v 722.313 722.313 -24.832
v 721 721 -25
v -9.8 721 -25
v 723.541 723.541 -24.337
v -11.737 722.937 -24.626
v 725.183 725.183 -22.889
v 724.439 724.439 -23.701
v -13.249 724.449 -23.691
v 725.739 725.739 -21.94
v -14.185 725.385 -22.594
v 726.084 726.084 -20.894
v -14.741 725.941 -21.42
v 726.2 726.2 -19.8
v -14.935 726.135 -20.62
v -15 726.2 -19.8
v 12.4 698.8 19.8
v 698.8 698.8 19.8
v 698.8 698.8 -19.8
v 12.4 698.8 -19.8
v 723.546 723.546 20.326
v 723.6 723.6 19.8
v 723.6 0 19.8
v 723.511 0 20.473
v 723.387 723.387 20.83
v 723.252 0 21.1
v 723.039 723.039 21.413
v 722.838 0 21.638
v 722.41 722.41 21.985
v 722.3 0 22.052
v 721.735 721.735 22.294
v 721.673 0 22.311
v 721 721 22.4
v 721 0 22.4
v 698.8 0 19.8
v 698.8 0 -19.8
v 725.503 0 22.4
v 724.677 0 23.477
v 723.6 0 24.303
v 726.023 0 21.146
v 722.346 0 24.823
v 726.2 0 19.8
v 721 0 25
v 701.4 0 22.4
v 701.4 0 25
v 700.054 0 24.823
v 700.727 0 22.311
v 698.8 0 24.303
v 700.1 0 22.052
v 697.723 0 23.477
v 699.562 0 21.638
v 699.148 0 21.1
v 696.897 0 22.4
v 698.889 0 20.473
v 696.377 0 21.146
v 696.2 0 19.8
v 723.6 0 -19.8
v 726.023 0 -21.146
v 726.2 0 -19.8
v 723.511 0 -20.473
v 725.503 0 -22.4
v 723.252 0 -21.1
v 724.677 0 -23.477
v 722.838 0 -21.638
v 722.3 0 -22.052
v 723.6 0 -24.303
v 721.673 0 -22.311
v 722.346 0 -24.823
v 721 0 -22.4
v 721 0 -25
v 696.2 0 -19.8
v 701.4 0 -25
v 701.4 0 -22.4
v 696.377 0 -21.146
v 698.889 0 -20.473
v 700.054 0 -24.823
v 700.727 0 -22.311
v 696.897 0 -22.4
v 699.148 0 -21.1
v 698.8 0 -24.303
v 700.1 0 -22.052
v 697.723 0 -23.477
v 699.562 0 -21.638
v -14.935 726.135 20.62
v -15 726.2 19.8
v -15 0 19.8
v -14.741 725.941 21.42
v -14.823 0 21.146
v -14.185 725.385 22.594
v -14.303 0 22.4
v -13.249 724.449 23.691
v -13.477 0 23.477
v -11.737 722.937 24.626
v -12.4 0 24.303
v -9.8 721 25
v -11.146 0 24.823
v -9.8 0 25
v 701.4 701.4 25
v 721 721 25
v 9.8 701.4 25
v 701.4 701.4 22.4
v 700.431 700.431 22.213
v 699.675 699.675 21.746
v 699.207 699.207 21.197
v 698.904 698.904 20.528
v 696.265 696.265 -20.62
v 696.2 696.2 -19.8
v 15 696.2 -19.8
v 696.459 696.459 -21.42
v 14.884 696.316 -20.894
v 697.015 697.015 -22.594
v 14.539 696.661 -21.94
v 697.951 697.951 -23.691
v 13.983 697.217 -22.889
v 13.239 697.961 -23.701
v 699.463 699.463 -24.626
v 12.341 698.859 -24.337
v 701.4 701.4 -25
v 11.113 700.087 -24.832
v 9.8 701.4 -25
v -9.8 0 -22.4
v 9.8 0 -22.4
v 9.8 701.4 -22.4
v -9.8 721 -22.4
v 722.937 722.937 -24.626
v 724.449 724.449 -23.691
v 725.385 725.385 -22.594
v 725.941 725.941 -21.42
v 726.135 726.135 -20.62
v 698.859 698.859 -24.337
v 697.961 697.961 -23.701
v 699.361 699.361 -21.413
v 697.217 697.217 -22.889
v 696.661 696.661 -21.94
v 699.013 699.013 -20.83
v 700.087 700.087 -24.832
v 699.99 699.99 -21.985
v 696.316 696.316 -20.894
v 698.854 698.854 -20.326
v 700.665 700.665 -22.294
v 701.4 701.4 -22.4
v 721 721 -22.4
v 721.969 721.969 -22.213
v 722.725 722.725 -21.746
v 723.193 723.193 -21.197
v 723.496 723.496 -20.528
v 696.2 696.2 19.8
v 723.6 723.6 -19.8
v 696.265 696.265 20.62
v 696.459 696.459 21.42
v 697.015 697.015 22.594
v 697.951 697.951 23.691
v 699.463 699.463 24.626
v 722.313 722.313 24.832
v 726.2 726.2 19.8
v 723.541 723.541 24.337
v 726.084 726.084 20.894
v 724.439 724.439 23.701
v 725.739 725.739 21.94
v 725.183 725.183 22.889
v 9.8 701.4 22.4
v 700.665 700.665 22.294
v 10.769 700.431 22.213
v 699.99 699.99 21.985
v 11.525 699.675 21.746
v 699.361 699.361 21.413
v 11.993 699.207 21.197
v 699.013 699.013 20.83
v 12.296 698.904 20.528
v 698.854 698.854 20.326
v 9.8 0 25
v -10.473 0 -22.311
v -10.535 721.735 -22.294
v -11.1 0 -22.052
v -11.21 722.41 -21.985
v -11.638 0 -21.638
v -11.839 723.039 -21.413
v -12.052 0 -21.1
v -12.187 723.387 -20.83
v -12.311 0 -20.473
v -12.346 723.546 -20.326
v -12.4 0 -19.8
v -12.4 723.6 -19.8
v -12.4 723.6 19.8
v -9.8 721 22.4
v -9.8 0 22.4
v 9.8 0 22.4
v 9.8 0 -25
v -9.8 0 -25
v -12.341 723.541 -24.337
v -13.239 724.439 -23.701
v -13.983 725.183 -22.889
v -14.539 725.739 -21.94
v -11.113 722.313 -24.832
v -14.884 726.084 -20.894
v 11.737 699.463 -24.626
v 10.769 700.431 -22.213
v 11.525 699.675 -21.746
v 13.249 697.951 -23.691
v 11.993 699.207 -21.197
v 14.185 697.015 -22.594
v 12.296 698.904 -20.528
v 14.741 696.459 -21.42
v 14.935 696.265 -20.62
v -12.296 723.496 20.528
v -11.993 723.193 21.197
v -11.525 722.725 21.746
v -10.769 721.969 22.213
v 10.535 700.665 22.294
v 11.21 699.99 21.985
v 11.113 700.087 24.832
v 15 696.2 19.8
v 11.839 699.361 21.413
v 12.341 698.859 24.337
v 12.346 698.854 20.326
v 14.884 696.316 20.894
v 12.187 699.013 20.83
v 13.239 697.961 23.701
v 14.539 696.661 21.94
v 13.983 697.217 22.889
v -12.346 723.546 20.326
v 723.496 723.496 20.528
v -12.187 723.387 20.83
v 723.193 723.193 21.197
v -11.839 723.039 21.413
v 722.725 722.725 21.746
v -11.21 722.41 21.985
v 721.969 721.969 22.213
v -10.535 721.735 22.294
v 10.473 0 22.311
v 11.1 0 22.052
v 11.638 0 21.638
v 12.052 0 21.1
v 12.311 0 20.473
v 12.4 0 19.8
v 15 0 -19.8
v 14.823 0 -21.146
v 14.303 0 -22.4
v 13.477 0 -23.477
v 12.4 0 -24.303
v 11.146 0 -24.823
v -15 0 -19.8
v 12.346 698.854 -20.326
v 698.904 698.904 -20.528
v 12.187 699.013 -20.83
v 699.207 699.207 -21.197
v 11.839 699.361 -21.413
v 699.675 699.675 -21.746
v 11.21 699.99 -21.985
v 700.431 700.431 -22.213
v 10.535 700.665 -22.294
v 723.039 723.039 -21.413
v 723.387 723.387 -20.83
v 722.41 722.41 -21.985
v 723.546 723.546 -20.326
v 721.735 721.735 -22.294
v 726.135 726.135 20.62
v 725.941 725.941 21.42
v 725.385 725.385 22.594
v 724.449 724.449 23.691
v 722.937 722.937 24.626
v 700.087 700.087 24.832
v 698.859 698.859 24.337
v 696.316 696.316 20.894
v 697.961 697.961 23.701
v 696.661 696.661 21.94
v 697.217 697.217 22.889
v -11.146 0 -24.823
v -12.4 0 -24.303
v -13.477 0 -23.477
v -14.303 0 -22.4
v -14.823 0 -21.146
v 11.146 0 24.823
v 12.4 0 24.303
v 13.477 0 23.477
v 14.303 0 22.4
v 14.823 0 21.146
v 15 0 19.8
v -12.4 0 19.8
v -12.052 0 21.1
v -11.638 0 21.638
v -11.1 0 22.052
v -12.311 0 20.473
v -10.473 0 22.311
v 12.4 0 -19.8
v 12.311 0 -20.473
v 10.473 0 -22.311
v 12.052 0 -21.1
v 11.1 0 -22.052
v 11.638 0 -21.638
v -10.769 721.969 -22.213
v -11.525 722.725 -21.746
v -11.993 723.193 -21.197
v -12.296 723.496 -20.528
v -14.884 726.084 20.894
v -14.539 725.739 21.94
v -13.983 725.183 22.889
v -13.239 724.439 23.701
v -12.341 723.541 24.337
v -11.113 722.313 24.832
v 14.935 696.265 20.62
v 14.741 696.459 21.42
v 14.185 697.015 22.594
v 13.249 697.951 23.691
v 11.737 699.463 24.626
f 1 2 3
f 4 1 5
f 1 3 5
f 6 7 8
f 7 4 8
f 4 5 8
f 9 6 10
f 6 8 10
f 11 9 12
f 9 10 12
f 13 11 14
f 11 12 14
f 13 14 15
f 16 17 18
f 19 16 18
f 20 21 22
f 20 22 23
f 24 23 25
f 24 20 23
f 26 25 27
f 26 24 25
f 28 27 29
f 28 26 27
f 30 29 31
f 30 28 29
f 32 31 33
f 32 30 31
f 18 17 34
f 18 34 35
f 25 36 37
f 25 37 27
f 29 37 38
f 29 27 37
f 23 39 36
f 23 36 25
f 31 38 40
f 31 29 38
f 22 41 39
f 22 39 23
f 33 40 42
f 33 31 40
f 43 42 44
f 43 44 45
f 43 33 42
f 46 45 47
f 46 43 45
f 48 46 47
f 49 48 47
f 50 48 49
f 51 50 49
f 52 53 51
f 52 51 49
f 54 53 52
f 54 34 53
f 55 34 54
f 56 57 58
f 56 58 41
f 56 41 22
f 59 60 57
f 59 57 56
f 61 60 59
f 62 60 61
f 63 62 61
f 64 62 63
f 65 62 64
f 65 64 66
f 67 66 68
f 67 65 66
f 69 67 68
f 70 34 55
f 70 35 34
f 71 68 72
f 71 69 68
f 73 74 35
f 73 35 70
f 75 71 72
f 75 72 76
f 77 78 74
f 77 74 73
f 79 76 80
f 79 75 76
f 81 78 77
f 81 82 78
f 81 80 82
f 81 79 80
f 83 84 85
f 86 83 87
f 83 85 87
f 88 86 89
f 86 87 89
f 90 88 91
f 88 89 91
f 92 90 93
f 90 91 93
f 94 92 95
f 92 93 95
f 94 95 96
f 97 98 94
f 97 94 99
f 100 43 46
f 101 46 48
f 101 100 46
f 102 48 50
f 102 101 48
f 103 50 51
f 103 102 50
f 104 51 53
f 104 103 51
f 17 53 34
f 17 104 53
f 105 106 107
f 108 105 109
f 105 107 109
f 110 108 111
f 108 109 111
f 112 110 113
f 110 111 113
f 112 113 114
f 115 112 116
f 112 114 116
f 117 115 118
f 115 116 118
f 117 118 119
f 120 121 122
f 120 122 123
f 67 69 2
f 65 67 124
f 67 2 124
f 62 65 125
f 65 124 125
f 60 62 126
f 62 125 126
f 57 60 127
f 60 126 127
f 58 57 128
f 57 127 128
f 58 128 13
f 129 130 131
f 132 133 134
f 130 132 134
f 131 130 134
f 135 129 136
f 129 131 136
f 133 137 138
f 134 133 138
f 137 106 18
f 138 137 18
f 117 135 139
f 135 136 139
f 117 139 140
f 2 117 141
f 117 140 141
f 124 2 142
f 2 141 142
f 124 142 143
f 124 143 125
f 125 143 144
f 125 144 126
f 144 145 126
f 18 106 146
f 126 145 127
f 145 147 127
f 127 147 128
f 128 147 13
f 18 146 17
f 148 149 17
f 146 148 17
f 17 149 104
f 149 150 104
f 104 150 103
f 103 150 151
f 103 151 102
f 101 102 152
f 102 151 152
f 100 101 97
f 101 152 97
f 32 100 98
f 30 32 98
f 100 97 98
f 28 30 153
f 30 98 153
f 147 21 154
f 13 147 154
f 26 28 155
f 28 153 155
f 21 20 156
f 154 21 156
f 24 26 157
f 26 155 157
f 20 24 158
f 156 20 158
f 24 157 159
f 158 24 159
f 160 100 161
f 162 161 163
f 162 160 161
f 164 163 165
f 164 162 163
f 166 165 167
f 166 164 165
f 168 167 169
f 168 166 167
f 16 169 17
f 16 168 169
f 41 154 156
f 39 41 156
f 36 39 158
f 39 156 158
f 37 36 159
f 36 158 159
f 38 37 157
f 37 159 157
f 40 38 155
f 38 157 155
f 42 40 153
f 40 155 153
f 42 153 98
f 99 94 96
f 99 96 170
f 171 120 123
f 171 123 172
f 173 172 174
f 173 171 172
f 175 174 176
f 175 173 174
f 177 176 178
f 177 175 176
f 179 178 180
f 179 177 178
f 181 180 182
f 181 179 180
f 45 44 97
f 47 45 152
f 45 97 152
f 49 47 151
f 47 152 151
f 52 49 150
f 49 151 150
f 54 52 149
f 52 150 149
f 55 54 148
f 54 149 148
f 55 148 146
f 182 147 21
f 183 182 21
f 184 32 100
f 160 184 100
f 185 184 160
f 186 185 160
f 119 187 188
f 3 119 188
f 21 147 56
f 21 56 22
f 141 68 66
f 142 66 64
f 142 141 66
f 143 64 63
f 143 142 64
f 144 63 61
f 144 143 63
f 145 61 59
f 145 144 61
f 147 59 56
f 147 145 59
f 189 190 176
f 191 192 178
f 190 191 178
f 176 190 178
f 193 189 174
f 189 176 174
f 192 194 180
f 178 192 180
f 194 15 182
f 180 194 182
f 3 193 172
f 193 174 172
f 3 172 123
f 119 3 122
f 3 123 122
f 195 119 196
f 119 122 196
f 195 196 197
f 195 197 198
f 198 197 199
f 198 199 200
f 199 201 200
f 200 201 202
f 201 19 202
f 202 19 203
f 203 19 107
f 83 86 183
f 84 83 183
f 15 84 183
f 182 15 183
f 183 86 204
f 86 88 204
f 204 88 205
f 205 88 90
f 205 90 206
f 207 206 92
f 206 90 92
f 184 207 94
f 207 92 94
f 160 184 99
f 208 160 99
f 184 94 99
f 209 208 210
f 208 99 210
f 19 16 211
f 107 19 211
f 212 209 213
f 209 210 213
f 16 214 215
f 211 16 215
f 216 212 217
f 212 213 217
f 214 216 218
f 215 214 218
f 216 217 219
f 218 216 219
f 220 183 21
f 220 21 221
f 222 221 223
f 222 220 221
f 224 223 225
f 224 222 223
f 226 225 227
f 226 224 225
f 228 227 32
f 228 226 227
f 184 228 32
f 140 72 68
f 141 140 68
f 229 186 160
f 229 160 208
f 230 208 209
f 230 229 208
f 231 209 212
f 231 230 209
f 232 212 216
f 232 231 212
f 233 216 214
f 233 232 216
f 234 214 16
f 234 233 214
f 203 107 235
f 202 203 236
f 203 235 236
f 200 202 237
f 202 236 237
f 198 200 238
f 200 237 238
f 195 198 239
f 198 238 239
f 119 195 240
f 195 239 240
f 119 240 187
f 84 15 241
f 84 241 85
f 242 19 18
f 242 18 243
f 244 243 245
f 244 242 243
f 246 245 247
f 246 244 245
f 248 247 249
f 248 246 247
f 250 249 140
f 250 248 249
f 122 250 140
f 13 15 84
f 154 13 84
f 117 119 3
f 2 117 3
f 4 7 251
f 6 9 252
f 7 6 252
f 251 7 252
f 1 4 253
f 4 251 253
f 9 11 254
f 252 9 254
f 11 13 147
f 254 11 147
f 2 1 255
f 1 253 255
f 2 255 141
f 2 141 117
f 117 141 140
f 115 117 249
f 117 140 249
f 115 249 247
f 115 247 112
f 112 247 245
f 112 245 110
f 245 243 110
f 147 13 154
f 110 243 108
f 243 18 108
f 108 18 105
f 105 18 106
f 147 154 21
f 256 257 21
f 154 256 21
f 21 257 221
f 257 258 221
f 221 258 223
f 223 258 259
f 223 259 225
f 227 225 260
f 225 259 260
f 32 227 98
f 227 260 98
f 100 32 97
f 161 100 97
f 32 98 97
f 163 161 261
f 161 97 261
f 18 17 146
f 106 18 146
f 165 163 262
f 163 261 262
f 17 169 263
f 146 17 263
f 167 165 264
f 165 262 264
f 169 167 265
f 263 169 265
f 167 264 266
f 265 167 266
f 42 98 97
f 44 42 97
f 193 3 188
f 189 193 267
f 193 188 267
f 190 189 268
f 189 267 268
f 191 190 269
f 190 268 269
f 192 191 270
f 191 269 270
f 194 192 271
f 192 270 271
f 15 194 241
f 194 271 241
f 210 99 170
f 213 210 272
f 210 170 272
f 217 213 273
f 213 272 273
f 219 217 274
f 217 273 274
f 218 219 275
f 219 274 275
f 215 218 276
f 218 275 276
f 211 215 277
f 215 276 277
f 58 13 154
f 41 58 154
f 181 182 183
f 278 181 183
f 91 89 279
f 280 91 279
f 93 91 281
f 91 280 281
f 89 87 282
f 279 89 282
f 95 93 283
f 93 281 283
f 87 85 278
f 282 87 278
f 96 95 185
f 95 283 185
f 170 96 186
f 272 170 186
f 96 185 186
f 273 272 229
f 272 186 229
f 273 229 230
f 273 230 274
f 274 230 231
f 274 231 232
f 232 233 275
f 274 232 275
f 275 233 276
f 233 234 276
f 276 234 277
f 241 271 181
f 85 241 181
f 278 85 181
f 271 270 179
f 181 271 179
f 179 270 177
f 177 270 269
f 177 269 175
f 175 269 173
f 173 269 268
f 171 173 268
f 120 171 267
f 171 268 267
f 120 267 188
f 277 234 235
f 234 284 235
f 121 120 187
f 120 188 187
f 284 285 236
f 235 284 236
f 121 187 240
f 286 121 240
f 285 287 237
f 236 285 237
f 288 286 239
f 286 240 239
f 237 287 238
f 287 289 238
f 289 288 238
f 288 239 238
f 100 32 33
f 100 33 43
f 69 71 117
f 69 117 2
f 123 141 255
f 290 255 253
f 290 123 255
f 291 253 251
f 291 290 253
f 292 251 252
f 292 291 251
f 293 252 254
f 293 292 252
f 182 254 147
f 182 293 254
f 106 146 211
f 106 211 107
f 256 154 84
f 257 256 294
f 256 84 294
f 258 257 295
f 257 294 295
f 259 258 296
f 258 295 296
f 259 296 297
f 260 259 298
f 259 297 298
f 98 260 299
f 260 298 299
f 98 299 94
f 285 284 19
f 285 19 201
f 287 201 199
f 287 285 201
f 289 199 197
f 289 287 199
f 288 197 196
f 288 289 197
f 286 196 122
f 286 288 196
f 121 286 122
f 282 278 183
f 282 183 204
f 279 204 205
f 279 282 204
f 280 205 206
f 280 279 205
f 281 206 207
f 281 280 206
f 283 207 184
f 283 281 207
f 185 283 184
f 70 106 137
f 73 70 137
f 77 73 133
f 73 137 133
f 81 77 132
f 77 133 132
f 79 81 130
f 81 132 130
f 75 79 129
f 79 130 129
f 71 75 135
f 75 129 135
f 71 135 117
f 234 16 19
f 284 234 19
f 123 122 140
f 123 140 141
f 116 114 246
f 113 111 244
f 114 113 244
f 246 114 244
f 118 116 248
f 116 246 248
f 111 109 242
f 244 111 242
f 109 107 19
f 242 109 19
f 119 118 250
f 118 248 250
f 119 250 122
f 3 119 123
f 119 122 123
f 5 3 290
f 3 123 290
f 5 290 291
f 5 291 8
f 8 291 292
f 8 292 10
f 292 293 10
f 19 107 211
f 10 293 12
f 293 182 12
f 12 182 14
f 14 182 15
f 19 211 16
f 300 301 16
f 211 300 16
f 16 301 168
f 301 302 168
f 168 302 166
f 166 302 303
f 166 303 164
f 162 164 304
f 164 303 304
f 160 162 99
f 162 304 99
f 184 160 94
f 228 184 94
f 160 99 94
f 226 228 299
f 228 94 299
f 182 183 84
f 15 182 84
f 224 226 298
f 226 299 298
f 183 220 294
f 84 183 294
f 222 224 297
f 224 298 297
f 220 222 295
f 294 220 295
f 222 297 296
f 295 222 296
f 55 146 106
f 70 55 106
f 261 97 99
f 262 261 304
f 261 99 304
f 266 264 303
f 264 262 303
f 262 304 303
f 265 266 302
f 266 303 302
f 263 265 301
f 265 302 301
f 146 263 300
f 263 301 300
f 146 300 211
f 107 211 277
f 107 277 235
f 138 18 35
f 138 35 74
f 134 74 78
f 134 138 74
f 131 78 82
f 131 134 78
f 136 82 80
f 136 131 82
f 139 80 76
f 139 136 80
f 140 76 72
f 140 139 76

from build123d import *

# Parameters (mm, degrees)
RECTANGULAR_TUBE_50_X_30_X_2_6_1_DEPTH   = 741.354759474
RECTANGULAR_TUBE_50_X_30_X_2_6_1_2_DEPTH = 771.509518948
RECTANGULAR_TUBE_50_X_30_X_2_6_1_3_DEPTH = 741.354759474


with BuildPart() as part:
    # Sketch11 → Rectangular tube 50 X 30 X 2.6(1) (new body)
    with BuildSketch(Plane(origin=(0, 0, 0), x_dir=(1, 0, 0), z_dir=(0, 1, 0))):
        with BuildLine():
            Line((-9.8, -25), (9.8, -25))
            ThreePointArc((9.8, -25), (13.476955262, -23.476955262), (15, -19.8))
            Line((15, -19.8), (15, 19.8))
            ThreePointArc((15, 19.8), (13.476955262, 23.476955262), (9.8, 25))
            Line((9.8, 25), (-9.8, 25))
            ThreePointArc((-9.8, 25), (-13.476955262, 23.476955262), (-15, 19.8))
            Line((-15, 19.8), (-15, -19.8))
            ThreePointArc((-15, -19.8), (-13.476955262, -23.476955262), (-9.8, -25))
        make_face()
        with BuildLine():
            Line((-9.8, -22.4), (9.8, -22.4))
            ThreePointArc((9.8, -22.4), (11.638477631, -21.638477631), (12.4, -19.8))
            Line((12.4, -19.8), (12.4, 19.8))
            ThreePointArc((12.4, 19.8), (11.638477631, 21.638477631), (9.8, 22.4))
            Line((9.8, 22.4), (-9.8, 22.4))
            ThreePointArc((-9.8, 22.4), (-11.638477631, 21.638477631), (-12.4, 19.8))
            Line((-12.4, 19.8), (-12.4, -19.8))
            ThreePointArc((-12.4, -19.8), (-11.638477631, -21.638477631), (-9.8, -22.4))
        make_face(mode=Mode.SUBTRACT)
    extrude(amount=RECTANGULAR_TUBE_50_X_30_X_2_6_1_DEPTH)

    # Rectangular tube 50 X 30 X 2.6(1) mitre 1
    split(bisect_by=Plane(origin=(0, 711.2, 0), x_dir=(0.707106781, -0.707106781, 0), z_dir=(-0.707106781, -0.707106781, 0)), keep=Keep.TOP)


with BuildPart() as body_2:
    # Sketch11 on segment 2 (carried to segment 2) → Rectangular tube 50 X 30 X 2.6_1 2 (new body)
    with BuildSketch(Plane(origin=(-30.154759474, 711.2, 0), x_dir=(0, -1, 0), z_dir=(1, 0, 0))):
        with BuildLine():
            Line((-9.8, -25), (9.8, -25))
            ThreePointArc((9.8, -25), (13.476955262, -23.476955262), (15, -19.8))
            Line((15, -19.8), (15, 19.8))
            ThreePointArc((15, 19.8), (13.476955262, 23.476955262), (9.8, 25))
            Line((9.8, 25), (-9.8, 25))
            ThreePointArc((-9.8, 25), (-13.476955262, 23.476955262), (-15, 19.8))
            Line((-15, 19.8), (-15, -19.8))
            ThreePointArc((-15, -19.8), (-13.476955262, -23.476955262), (-9.8, -25))
        make_face()
        with BuildLine():
            Line((-9.8, -22.4), (9.8, -22.4))
            ThreePointArc((9.8, -22.4), (11.638477631, -21.638477631), (12.4, -19.8))
            Line((12.4, -19.8), (12.4, 19.8))
            ThreePointArc((12.4, 19.8), (11.638477631, 21.638477631), (9.8, 22.4))
            Line((9.8, 22.4), (-9.8, 22.4))
            ThreePointArc((-9.8, 22.4), (-11.638477631, 21.638477631), (-12.4, 19.8))
            Line((-12.4, 19.8), (-12.4, -19.8))
            ThreePointArc((-12.4, -19.8), (-11.638477631, -21.638477631), (-9.8, -22.4))
        make_face(mode=Mode.SUBTRACT)
    extrude(amount=RECTANGULAR_TUBE_50_X_30_X_2_6_1_2_DEPTH)

    # Rectangular tube 50 X 30 X 2.6_1 2 mitre
    split(bisect_by=Plane(origin=(0, 711.2, 0), x_dir=(-0.707106781, 0.707106781, 0), z_dir=(0.707106781, 0.707106781, 0)), keep=Keep.TOP)

    # Rectangular tube 50 X 30 X 2.6_1 2 m 2
    split(bisect_by=Plane(origin=(711.2, 711.2, 0), x_dir=(-0.707106781, -0.707106781, 0), z_dir=(-0.707106781, 0.707106781, 0)), keep=Keep.TOP)


with BuildPart() as body_3:
    # Sketch11 on segment 3 (carried to segment 3) → Rectangular tube 50 X 30 X 2.6_1 3 (new body)
    with BuildSketch(Plane(origin=(711.2, 741.354759474, 0), x_dir=(-1, 0, 0), z_dir=(0, -1, 0))):
        with BuildLine():
            Line((-9.8, -25), (9.8, -25))
            ThreePointArc((9.8, -25), (13.476955262, -23.476955262), (15, -19.8))
            Line((15, -19.8), (15, 19.8))
            ThreePointArc((15, 19.8), (13.476955262, 23.476955262), (9.8, 25))
            Line((9.8, 25), (-9.8, 25))
            ThreePointArc((-9.8, 25), (-13.476955262, 23.476955262), (-15, 19.8))
            Line((-15, 19.8), (-15, -19.8))
            ThreePointArc((-15, -19.8), (-13.476955262, -23.476955262), (-9.8, -25))
        make_face()
        with BuildLine():
            Line((-9.8, -22.4), (9.8, -22.4))
            ThreePointArc((9.8, -22.4), (11.638477631, -21.638477631), (12.4, -19.8))
            Line((12.4, -19.8), (12.4, 19.8))
            ThreePointArc((12.4, 19.8), (11.638477631, 21.638477631), (9.8, 22.4))
            Line((9.8, 22.4), (-9.8, 22.4))
            ThreePointArc((-9.8, 22.4), (-11.638477631, 21.638477631), (-12.4, 19.8))
            Line((-12.4, 19.8), (-12.4, -19.8))
            ThreePointArc((-12.4, -19.8), (-11.638477631, -21.638477631), (-9.8, -22.4))
        make_face(mode=Mode.SUBTRACT)
    extrude(amount=RECTANGULAR_TUBE_50_X_30_X_2_6_1_3_DEPTH)

    # Rectangular tube 50 X 30 X 2.6_1 3 mitre
    split(bisect_by=Plane(origin=(711.2, 711.2, 0), x_dir=(0.707106781, 0.707106781, 0), z_dir=(0.707106781, -0.707106781, 0)), keep=Keep.TOP)


solid = Compound([part.part, body_2.part, body_3.part])
